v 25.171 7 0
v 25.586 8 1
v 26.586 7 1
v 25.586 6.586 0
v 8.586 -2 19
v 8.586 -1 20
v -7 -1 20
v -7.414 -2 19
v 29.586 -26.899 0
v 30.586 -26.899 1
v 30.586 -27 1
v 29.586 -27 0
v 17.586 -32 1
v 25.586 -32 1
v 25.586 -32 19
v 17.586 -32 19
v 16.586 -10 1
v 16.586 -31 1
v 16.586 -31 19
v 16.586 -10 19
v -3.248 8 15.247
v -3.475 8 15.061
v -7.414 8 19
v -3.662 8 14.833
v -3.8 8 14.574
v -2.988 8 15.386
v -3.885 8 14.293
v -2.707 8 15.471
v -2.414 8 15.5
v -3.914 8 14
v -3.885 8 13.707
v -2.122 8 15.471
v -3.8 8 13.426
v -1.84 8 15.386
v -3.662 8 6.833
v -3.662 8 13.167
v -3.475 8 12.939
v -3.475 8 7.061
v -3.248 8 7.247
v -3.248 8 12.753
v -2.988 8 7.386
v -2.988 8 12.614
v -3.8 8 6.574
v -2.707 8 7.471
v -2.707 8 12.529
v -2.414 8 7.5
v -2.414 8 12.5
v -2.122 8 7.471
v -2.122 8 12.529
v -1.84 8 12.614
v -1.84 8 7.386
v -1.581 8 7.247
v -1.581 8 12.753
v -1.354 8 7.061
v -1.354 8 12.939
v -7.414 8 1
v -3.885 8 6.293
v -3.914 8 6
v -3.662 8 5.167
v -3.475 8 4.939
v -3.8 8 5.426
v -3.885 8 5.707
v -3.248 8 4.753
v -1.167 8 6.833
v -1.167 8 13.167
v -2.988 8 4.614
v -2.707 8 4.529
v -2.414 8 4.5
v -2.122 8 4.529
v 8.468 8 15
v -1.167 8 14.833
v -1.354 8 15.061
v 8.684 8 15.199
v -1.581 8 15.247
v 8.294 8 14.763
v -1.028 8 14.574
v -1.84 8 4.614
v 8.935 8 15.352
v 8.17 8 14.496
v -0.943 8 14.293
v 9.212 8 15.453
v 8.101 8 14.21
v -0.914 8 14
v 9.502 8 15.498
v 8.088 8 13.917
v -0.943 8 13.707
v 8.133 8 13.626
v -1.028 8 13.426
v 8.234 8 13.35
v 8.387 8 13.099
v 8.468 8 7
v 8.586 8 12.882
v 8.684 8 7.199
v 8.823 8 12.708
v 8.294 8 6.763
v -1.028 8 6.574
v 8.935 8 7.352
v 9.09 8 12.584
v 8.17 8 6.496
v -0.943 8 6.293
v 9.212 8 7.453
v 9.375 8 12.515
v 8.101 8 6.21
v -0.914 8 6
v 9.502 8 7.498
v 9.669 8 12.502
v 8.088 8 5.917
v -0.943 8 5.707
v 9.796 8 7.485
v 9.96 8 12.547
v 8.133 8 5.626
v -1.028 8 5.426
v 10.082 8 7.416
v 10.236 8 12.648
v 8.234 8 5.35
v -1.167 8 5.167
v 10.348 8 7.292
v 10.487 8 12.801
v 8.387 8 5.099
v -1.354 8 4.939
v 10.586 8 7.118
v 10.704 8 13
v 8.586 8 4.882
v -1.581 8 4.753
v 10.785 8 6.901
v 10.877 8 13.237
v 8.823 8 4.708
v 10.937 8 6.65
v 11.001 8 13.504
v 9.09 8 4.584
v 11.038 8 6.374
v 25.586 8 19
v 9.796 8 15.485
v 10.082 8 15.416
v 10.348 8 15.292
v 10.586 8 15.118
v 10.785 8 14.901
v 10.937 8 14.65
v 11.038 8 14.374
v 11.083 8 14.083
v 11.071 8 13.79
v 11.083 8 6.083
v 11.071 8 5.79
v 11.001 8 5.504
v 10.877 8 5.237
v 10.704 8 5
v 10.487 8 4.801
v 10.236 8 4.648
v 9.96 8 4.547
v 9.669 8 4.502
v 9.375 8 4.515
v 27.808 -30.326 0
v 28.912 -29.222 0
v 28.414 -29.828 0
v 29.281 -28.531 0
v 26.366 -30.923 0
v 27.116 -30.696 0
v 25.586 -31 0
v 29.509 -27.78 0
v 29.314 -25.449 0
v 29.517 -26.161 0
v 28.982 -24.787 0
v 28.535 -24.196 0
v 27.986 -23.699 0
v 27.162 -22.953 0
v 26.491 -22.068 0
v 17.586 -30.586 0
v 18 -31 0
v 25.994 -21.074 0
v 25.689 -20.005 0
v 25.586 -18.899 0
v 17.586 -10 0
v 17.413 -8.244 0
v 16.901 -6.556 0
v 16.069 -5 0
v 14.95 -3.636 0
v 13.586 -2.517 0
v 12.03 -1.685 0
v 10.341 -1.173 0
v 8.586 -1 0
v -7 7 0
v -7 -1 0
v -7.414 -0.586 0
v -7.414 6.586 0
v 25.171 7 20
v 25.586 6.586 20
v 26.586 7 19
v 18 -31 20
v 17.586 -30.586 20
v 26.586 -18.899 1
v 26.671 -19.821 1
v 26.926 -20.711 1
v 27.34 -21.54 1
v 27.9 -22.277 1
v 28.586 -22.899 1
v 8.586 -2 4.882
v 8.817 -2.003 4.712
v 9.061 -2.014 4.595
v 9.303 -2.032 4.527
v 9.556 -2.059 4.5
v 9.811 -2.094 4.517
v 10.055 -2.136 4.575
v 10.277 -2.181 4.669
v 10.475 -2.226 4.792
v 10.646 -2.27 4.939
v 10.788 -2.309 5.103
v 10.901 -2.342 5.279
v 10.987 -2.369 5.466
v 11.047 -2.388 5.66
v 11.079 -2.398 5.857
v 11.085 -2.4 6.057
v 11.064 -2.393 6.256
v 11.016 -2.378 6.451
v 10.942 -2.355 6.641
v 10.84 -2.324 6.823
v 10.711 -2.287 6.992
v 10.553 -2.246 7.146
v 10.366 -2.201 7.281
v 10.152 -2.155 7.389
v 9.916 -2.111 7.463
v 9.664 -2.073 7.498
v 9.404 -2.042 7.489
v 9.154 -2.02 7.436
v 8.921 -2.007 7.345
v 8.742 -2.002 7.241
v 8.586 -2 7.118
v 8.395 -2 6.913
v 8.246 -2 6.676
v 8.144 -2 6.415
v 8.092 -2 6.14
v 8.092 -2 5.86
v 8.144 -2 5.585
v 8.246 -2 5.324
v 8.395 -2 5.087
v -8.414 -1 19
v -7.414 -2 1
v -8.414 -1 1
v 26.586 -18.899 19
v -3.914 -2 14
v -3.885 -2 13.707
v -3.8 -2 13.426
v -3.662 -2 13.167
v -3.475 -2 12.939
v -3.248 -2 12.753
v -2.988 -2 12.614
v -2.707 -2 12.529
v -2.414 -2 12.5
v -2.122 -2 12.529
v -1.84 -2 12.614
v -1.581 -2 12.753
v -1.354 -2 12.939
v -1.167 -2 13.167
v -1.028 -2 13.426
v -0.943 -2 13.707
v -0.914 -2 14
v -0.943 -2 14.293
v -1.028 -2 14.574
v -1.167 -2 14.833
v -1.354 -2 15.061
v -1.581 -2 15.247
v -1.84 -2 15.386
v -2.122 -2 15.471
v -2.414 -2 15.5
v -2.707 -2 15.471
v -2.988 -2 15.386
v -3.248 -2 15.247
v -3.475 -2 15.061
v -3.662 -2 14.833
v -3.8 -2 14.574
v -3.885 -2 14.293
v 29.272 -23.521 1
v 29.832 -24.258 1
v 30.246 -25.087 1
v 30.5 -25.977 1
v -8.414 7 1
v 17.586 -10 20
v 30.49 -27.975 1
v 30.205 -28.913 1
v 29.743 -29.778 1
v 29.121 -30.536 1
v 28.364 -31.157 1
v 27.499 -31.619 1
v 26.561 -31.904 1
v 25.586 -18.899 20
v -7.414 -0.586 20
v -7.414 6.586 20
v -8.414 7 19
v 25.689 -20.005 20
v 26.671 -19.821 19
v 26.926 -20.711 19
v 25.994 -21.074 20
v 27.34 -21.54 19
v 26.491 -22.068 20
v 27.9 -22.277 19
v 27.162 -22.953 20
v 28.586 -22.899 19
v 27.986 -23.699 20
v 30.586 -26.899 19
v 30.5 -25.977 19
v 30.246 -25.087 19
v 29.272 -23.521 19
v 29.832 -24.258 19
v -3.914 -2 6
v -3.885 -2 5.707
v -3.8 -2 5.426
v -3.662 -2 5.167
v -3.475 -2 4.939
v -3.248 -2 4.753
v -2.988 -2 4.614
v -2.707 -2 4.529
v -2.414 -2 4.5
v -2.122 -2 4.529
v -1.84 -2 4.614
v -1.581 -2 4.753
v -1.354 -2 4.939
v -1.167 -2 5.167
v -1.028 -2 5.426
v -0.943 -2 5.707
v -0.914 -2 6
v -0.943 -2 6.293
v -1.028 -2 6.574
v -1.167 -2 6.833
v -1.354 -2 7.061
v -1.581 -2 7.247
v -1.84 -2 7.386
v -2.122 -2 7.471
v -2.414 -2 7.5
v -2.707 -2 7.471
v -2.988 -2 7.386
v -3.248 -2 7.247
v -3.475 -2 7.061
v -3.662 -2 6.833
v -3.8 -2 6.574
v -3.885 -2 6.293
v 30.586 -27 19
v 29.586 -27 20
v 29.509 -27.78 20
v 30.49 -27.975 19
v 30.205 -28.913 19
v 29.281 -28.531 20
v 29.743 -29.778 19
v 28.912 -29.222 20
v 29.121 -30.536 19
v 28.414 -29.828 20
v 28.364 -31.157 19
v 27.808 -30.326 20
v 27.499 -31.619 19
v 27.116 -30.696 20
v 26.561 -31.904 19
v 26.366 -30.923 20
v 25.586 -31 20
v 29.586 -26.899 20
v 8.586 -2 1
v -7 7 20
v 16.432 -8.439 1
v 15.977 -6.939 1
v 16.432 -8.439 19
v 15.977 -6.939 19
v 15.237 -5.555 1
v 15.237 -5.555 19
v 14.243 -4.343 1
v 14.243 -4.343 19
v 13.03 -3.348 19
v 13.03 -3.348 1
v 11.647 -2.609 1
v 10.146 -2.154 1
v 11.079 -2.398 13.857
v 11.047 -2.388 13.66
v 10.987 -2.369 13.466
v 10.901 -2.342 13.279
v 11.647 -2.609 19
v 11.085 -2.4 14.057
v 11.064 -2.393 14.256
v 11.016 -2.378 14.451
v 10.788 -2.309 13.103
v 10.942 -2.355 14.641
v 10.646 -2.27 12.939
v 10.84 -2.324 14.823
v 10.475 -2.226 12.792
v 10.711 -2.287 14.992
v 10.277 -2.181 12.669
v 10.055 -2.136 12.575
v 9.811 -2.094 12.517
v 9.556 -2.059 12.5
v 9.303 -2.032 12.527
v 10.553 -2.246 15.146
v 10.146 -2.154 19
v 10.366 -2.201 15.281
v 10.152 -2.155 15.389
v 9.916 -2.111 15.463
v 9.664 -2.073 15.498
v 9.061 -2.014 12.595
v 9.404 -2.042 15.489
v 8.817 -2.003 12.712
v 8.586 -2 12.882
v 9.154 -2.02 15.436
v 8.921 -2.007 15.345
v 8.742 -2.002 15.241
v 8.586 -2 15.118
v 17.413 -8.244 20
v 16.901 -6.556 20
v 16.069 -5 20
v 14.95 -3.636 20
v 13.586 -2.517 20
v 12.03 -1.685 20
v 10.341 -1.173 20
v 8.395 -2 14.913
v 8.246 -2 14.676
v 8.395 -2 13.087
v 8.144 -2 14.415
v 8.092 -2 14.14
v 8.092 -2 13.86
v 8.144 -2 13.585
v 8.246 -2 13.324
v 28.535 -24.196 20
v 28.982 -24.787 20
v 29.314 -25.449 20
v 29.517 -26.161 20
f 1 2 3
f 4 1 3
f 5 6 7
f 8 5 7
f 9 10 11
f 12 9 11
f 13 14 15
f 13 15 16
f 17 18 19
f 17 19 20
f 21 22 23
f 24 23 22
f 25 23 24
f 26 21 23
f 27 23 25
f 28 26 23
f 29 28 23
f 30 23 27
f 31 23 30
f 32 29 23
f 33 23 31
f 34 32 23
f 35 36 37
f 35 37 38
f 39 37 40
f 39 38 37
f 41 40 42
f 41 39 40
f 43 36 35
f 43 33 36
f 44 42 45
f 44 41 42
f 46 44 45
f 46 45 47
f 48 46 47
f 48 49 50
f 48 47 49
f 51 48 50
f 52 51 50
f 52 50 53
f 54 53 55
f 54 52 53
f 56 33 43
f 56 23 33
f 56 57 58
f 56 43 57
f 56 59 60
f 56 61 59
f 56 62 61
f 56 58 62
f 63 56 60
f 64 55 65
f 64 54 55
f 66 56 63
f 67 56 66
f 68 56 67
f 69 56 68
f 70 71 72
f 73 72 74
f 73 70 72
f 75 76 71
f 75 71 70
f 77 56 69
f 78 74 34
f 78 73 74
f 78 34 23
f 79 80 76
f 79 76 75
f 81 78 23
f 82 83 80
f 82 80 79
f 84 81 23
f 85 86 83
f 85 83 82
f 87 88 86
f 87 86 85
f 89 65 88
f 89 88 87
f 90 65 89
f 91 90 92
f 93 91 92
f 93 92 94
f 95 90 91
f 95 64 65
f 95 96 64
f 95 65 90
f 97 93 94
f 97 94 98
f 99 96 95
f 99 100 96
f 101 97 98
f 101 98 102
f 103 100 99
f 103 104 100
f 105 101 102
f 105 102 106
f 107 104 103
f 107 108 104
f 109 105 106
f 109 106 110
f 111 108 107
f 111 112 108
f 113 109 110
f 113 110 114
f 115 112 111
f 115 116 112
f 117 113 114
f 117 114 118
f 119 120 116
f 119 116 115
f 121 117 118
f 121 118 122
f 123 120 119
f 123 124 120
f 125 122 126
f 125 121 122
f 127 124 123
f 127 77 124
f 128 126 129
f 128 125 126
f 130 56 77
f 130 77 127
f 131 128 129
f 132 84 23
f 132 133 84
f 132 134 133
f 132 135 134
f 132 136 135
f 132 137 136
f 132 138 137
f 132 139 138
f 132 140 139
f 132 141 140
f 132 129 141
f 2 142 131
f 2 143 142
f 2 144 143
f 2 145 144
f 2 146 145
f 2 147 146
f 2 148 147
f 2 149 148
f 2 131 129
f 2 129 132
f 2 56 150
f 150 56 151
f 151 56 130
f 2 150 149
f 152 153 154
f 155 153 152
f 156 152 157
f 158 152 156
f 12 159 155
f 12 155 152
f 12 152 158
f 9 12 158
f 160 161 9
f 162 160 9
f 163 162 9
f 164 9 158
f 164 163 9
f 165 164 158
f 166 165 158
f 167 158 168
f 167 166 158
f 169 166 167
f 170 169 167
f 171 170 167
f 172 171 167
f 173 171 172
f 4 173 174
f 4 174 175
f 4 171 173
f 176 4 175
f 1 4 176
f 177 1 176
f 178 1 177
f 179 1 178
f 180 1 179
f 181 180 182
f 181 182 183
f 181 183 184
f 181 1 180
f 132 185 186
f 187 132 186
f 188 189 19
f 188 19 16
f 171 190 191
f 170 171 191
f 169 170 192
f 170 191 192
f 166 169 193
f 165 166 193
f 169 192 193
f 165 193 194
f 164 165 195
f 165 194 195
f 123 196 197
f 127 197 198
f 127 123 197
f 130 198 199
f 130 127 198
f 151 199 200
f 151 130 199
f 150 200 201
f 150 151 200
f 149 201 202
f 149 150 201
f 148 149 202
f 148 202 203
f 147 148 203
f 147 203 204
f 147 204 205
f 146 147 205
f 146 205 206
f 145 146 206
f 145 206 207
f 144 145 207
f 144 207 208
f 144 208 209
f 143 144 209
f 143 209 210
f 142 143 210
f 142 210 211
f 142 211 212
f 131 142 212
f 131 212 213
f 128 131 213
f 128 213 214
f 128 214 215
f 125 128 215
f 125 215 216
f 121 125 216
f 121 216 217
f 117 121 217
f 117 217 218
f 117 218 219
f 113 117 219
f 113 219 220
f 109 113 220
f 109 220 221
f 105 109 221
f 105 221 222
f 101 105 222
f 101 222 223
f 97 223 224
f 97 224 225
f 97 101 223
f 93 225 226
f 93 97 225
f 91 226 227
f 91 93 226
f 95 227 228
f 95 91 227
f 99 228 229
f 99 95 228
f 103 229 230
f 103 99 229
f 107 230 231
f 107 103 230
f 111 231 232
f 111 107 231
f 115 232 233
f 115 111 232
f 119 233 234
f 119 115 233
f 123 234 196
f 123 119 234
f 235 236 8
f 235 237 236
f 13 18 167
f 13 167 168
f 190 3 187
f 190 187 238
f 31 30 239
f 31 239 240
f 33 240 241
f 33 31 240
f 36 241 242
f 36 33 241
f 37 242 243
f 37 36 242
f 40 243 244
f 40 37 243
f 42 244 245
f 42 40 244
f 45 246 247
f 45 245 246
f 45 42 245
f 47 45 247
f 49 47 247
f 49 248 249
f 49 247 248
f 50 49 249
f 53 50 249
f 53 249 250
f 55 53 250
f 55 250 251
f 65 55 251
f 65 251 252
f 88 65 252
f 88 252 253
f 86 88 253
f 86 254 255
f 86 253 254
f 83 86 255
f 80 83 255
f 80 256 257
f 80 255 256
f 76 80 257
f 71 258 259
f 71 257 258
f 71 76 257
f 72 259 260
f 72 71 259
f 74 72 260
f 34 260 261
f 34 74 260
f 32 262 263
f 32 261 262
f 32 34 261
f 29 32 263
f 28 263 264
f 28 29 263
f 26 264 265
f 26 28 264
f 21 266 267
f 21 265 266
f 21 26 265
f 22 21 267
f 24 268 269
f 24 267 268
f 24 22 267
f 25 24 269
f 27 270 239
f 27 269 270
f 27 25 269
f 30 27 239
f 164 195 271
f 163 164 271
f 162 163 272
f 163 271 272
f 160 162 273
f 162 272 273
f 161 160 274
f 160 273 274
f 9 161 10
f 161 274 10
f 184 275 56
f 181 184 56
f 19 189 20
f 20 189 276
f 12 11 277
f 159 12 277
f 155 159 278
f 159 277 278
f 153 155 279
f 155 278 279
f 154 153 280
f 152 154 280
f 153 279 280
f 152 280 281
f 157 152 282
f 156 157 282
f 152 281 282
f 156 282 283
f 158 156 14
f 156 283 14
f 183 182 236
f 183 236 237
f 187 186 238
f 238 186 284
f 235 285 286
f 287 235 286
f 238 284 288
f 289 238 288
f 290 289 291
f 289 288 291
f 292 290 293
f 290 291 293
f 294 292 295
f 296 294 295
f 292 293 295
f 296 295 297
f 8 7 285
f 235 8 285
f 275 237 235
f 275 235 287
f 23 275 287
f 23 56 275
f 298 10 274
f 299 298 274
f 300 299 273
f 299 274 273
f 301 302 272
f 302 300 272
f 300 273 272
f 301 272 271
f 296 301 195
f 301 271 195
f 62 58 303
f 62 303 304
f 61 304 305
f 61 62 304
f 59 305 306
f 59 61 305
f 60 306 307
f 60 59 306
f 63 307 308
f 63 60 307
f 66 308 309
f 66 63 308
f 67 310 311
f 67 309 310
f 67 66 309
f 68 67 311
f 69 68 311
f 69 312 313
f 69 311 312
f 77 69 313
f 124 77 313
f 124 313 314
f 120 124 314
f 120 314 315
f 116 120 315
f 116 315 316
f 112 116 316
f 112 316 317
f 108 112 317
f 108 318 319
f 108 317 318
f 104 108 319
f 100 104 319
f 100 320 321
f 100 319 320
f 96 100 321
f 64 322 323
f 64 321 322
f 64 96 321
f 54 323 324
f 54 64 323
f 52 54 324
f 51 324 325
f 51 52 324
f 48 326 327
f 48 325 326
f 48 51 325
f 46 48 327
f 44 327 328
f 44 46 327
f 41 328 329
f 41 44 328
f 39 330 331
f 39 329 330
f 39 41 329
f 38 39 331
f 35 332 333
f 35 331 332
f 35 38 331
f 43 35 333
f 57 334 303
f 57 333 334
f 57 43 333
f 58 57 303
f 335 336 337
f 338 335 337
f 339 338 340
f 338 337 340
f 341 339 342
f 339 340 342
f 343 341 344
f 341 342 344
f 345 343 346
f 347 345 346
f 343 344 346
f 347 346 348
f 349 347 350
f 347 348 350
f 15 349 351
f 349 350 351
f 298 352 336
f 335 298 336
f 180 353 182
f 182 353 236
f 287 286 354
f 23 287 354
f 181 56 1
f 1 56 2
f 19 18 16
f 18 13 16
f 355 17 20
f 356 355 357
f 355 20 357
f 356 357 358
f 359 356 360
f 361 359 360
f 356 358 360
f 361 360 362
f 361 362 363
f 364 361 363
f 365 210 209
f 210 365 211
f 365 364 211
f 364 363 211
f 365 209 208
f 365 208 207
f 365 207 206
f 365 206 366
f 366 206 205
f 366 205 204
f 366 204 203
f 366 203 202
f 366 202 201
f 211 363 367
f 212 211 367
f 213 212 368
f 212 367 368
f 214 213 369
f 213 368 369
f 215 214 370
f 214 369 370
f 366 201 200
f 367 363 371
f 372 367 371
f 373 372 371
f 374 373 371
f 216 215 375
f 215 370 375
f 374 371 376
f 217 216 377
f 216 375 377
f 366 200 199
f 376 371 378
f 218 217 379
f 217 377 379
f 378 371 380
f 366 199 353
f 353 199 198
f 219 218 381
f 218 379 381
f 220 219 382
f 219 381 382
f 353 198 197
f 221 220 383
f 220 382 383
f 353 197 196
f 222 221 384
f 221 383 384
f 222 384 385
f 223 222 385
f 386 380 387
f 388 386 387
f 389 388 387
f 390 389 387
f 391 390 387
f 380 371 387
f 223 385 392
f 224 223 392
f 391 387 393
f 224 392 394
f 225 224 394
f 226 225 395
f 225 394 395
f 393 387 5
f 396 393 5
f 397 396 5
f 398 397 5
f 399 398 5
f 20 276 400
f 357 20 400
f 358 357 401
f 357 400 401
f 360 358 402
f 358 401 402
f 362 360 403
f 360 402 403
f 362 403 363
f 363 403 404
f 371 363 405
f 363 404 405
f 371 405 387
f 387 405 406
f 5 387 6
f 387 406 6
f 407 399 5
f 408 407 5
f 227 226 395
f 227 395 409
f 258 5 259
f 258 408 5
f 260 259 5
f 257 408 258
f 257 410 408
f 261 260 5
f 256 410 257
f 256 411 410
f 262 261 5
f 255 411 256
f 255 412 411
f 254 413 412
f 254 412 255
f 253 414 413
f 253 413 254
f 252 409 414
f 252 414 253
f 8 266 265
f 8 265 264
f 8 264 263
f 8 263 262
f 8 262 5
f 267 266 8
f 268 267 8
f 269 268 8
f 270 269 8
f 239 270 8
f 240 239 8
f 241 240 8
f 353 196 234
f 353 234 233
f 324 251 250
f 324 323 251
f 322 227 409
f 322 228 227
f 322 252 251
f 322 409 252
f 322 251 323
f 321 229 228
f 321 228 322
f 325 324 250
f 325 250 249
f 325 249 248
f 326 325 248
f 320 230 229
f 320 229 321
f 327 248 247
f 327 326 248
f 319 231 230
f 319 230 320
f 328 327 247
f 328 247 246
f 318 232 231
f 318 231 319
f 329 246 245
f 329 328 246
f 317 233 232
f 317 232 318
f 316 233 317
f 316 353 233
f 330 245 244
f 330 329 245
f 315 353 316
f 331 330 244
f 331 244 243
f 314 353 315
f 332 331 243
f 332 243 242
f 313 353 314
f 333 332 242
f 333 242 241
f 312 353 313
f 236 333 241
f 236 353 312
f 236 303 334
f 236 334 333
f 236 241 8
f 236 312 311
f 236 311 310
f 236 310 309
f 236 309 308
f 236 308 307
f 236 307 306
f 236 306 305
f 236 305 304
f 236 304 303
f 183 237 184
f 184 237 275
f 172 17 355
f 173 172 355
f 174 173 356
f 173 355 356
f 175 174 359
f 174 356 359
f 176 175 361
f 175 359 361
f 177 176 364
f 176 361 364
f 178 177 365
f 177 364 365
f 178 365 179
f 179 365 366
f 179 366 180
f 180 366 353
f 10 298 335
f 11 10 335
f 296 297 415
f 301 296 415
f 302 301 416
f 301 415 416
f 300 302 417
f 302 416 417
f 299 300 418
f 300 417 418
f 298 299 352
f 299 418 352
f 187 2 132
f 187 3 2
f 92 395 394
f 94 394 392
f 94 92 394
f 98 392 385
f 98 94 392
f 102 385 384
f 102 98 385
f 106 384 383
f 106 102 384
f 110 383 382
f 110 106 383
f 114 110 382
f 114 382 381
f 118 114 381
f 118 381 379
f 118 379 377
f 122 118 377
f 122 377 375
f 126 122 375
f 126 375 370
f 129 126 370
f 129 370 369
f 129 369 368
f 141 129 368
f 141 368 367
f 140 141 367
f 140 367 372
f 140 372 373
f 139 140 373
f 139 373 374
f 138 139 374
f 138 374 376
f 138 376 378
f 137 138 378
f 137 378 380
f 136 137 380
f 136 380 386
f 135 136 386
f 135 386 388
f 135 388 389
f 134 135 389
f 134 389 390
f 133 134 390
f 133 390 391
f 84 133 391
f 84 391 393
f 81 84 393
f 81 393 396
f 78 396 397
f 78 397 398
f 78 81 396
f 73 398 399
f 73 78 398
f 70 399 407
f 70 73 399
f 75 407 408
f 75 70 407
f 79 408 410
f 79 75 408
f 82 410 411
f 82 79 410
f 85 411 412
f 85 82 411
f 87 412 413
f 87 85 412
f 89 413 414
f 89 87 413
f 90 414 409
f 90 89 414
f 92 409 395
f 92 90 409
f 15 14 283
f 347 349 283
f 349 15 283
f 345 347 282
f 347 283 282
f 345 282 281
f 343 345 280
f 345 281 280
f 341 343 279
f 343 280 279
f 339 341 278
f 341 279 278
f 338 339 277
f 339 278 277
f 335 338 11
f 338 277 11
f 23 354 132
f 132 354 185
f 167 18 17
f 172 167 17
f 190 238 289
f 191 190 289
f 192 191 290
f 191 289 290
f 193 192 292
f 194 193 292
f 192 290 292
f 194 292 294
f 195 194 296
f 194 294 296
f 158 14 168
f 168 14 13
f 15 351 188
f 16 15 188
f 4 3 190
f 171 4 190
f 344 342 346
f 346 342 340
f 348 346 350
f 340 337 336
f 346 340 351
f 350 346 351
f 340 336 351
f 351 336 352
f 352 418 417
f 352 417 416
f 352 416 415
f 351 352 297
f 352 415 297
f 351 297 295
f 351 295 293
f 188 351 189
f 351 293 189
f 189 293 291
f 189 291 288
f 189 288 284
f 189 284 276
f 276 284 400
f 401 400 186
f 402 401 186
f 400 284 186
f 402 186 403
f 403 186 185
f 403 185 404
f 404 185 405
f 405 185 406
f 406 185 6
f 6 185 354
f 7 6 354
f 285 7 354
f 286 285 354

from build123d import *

# Parameters (mm, degrees)
EXTRUDE_3_DEPTH          = 20
FILLET_3_R               = 5
FILLET_4_R               = 5
FILLET_5_R               = 8
CUT_EXTRUDE_1_DEPTH      = 20
CUT_EXTRUDE_1_DEPTH_BACK = 20
SKETCH_6_R               = 1.5
CHAMFER_1_SIZE           = 1
CHAMFER_2_SIZE           = 1


with BuildPart() as part:
    # 草图5 → 凸台-拉伸3 (new body)
    with BuildSketch(Plane.XY):
        Polygon((-8.414313081, 8), (26.585686919, 8), (26.585686919, -22), (30.585686919, -22), (30.585686919, -32), (16.585686919, -32), (16.585686919, -2), (-8.414313081, -2), align=None)
    extrude(amount=EXTRUDE_3_DEPTH)

    # 圆角3
    # the kernel refuses this fillet: 5 mm, written as the material it takes off along each edge
    with BuildSketch(Plane(origin=(30.585686919, -32, -12.5), x_dir=(0, 1, 0), z_dir=(0, 0, 1))) as fillet_3_piece_1:
        with BuildLine():
            CenterArc((FILLET_3_R, FILLET_3_R), FILLET_3_R, 180, 90)
            Line((0, FILLET_3_R), (-FILLET_3_R * 0.02, FILLET_3_R))
            Line((-FILLET_3_R * 0.02, FILLET_3_R), (-FILLET_3_R * 0.02, -FILLET_3_R * 0.02))
            Line((-FILLET_3_R * 0.02, -FILLET_3_R * 0.02), (FILLET_3_R, -FILLET_3_R * 0.02))
            Line((FILLET_3_R, -FILLET_3_R * 0.02), (FILLET_3_R, 0))
        make_face()
    extrude(amount=45, mode=Mode.SUBTRACT)
    with BuildSketch(Plane(origin=(30.585686919, -22, -12.247448714), x_dir=(-1.0, -1.569411267609618e-12, 0), z_dir=(0, 0, 1))) as fillet_3_piece_2:
        with BuildLine():
            CenterArc((5, 4.898979486), FILLET_3_R, 180, 78.463040967)
            Line((0, 4.898979486), (-0.1, 4.898979486))
            Line((-0.1, 4.898979486), (-0.1, 0))
            Line((-0.1, 0), (0, -0.1))
            ThreePointArc((0, -0.1), (2, -0.1), (3.98, -0.09797959))
            Line((3.98, -0.09797959), (4, 0))
        make_face()
    extrude(amount=44.494897428, mode=Mode.SUBTRACT)

    # 圆角4
    fillet_4_edges = [part.edges().sort_by_distance(p)[0] for p in [
        (26.585686919, -22, 10),
    ]]
    fillet(fillet_4_edges, radius=FILLET_4_R)

    # 圆角5
    fillet_5_edges = [part.edges().sort_by_distance(p)[0] for p in [
        (16.585686919, -2, 10),
    ]]
    fillet(fillet_5_edges, radius=FILLET_5_R)

    # 草图6 → 切除-拉伸1 (cut, two sides: drawn at the far end of the back side and taken through both)
    with BuildSketch(Plane(origin=(0, -2, 0), x_dir=(-1, 0, 0), z_dir=(0, -1, 0)).offset(-CUT_EXTRUDE_1_DEPTH_BACK)):
        with Locations((2.414313081, -14)):
            Circle(SKETCH_6_R)
        with Locations((2.414313081, -6)):
            Circle(SKETCH_6_R)
        with Locations(Location((-9.585686919, -6, 0), (0, 0, 48.189685104))):
            Circle(SKETCH_6_R)
        with Locations(Location((-9.585686919, -14, 0), (0, 0, 48.189685104))):
            Circle(SKETCH_6_R)
    extrude(amount=CUT_EXTRUDE_1_DEPTH + CUT_EXTRUDE_1_DEPTH_BACK, mode=Mode.SUBTRACT)

    # 倒角1
    chamfer_1_edges = [part.edges().sort_by_distance(p)[0] for p in [
        (-8.414313081, 8, 10),
        (26.585686919, 8, 10),
        (16.585686919, -32, 10),
        (-8.414313081, -2, 10),
    ]]
    chamfer(chamfer_1_edges, length=CHAMFER_1_SIZE)

    # 倒角2
    chamfer_2_edges = [part.edges().sort_by_distance(p)[0] for p in [
        (30.585686919, -26.949489743, 0),
        (30.585686919, -26.949489743, 20),
        (29.121220825, -30.535533906, 0),
        (30.057822874, -24.662911508, 20),
        (29.121220825, -30.535533906, 20),
        (26.585686919, -5.949489743, 0),
        (26.585686919, -5.949489743, 20),
        (30.057822874, -24.662911508, 0),
        (27.113550964, -21.135047463, 0),
        (27.113550964, -21.135047463, 20),
        (16.585686919, -20.5, 0),
        (16.585686919, -20.5, 20),
        (14.242541169, -4.343145751, 0),
        (14.242541169, -4.343145751, 20),
        (9.085686919, 8, 0),
        (9.085686919, 8, 20),
        (21.585686919, -32, 0),
        (0.585686919, -2, 0),
        (-8.414313081, 3, 0),
        (17.085686919, -31.5, 0),
        (-7.914313081, -1.5, 0),
        (-7.914313081, 7.5, 0),
        (26.085686919, 7.5, 0),
        (21.585686919, -32, 20),
        (-8.414313081, 3, 20),
        (0.585686919, -2, 20),
        (17.085686919, -31.5, 20),
        (-7.914313081, -1.5, 20),
        (-7.914313081, 7.5, 20),
        (26.085686919, 7.5, 20),
    ]]
    chamfer(chamfer_2_edges, length=CHAMFER_2_SIZE)


solid = part.part
